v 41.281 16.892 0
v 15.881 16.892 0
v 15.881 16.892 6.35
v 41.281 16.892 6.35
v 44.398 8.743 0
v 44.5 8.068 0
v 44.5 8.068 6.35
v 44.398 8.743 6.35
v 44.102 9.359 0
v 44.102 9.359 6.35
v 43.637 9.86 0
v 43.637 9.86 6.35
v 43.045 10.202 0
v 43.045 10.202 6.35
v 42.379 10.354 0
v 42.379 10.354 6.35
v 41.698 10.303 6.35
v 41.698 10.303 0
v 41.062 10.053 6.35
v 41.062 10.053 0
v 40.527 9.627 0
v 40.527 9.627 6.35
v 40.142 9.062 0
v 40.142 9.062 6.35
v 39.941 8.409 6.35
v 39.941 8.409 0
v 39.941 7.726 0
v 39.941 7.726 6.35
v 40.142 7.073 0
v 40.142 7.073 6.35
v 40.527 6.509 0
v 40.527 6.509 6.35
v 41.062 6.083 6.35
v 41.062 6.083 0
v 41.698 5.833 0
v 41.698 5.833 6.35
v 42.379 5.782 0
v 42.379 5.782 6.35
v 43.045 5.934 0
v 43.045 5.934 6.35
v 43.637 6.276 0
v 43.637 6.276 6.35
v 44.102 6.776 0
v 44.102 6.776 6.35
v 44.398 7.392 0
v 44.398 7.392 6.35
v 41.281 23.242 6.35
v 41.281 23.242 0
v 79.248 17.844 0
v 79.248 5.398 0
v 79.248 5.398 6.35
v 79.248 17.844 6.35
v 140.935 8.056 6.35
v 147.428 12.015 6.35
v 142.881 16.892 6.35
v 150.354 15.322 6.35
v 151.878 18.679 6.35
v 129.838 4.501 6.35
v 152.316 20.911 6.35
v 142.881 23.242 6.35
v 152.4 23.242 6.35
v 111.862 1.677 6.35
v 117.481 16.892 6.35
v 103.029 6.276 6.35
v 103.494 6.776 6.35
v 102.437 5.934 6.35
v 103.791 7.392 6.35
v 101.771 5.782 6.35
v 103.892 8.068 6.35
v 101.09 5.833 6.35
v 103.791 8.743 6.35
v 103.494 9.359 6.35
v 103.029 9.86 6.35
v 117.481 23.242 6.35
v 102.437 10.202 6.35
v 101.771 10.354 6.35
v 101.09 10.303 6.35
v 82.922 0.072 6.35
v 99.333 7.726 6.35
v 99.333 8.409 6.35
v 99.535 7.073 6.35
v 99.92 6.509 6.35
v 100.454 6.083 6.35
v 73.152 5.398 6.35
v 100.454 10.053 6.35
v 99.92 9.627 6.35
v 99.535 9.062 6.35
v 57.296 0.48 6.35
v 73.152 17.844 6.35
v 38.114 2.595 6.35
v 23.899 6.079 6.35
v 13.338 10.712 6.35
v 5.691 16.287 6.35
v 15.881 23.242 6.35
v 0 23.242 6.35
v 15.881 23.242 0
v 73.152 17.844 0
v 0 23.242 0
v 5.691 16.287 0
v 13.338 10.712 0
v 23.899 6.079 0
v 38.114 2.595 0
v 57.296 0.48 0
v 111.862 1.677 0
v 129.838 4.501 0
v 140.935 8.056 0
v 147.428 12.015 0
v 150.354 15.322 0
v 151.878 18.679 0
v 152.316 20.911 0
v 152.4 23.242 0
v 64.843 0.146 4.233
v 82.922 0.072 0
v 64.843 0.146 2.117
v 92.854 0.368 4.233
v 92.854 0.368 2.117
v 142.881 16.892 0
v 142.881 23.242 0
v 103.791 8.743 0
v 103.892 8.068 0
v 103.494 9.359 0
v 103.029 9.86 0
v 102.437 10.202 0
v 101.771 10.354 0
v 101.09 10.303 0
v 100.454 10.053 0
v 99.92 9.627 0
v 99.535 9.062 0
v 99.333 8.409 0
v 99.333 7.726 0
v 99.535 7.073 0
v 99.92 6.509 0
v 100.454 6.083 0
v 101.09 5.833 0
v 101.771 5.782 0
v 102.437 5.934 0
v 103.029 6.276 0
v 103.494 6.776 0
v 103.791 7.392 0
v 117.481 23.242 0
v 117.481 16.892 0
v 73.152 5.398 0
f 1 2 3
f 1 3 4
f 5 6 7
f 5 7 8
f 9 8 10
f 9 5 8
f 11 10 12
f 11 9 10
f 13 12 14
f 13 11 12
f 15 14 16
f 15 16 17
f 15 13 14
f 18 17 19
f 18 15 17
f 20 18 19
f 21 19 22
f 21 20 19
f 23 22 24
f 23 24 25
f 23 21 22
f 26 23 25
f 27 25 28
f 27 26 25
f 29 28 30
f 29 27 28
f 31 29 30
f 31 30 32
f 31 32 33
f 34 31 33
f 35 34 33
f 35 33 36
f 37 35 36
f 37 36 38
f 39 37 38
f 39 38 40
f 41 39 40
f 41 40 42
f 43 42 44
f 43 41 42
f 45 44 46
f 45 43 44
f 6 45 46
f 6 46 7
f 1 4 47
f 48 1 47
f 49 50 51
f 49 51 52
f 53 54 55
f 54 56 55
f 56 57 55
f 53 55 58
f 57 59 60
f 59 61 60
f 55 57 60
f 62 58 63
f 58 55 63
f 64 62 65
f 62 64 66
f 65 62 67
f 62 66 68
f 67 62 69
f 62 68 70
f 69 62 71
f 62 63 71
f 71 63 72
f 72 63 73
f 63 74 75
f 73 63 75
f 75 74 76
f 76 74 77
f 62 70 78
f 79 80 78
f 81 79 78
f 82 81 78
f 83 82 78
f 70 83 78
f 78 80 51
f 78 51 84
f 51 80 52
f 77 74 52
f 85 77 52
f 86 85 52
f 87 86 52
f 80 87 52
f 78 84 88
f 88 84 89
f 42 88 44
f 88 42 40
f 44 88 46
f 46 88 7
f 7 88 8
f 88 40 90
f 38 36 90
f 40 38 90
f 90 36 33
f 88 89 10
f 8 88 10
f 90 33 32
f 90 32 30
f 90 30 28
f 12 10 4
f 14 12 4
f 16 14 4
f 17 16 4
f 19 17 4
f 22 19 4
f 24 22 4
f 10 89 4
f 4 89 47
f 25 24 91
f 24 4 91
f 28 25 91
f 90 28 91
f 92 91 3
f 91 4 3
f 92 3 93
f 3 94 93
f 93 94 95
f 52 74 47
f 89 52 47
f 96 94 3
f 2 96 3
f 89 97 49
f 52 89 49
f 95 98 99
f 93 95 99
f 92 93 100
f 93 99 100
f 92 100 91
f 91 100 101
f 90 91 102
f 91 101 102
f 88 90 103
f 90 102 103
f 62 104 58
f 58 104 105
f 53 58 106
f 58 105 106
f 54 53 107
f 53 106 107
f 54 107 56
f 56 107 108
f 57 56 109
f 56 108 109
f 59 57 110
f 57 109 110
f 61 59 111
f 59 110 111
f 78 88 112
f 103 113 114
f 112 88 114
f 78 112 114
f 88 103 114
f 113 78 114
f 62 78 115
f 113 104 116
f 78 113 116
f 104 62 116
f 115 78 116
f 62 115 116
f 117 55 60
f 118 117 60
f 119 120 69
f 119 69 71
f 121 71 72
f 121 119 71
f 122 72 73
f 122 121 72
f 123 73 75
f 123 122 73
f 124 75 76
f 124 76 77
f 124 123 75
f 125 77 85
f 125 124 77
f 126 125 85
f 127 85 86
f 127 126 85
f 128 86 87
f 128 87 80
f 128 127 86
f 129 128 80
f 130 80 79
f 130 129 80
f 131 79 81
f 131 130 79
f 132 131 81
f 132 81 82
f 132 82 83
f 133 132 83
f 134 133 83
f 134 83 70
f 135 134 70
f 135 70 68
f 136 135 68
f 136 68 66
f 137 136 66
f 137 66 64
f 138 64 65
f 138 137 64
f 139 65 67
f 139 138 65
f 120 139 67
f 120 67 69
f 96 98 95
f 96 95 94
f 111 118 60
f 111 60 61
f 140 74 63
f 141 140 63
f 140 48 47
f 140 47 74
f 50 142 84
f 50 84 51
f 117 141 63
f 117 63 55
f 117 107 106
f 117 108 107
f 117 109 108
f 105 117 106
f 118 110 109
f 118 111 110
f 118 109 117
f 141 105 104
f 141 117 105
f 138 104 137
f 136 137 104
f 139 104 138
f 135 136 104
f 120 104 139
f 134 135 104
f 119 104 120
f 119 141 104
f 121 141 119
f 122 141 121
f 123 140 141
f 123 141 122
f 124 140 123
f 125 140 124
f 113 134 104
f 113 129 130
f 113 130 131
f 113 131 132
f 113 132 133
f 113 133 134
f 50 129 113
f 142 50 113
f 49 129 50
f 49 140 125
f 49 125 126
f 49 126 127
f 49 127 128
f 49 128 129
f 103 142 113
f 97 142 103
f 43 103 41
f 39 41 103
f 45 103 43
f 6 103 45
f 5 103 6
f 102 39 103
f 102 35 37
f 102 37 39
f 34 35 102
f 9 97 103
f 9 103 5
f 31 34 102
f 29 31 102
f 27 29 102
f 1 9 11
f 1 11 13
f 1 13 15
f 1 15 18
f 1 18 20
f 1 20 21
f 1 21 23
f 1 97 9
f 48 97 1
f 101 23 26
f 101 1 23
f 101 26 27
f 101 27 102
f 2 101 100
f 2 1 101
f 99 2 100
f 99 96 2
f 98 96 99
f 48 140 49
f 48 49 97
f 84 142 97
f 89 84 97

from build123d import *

# Parameters (mm, degrees)
SKETCH1_R           = 2.29235
SKETCH1_W           = 6.096
SKETCH1_H           = 12.446
BOSS_EXTRUDE1_DEPTH = 6.35


with BuildPart() as part:
    # Sketch1 → Boss-Extrude1 (new body)
    with BuildSketch(Plane.XY):
        with BuildLine():
            Line((0, 23.24229762), (15.880645326, 23.24229762))
            Line((15.880645326, 23.24229762), (15.880645326, 16.89229762))
            Line((15.880645326, 16.89229762), (41.280645326, 16.89229762))
            Line((41.280645326, 16.89229762), (41.280645326, 23.24229762))
            Line((41.280645326, 23.24229762), (117.480645326, 23.24229762))
            Line((117.480645326, 23.24229762), (117.480645326, 16.89229762))
            Line((117.480645326, 16.89229762), (142.880645326, 16.89229762))
            Line((142.880645326, 16.89229762), (142.880645326, 23.24229762))
            Line((142.880645326, 23.24229762), (152.4, 23.24229762))
            add(Edge.make_bspline(
                [(0, 23.24229762), (9.595728413, 7.571672257), (37.691629547, -0.62330484), (137.924513907, 0.735082948), (152.821327453, 10.851345908), (152.4, 23.24229762)],
                knots=[0, 0, 0, 0, 0.362368997, 0.462368997, 1, 1, 1, 1], degree=3))
        make_face()
        with Locations((101.6, 8.067795146)):
            Circle(SKETCH1_R, mode=Mode.SUBTRACT)
        with Locations((42.207808654, 8.067795146)):
            Circle(SKETCH1_R, mode=Mode.SUBTRACT)
        with Locations((76.2, 11.62114881)):
            Rectangle(SKETCH1_W, SKETCH1_H, mode=Mode.SUBTRACT)
    extrude(amount=BOSS_EXTRUDE1_DEPTH)


solid = part.part
